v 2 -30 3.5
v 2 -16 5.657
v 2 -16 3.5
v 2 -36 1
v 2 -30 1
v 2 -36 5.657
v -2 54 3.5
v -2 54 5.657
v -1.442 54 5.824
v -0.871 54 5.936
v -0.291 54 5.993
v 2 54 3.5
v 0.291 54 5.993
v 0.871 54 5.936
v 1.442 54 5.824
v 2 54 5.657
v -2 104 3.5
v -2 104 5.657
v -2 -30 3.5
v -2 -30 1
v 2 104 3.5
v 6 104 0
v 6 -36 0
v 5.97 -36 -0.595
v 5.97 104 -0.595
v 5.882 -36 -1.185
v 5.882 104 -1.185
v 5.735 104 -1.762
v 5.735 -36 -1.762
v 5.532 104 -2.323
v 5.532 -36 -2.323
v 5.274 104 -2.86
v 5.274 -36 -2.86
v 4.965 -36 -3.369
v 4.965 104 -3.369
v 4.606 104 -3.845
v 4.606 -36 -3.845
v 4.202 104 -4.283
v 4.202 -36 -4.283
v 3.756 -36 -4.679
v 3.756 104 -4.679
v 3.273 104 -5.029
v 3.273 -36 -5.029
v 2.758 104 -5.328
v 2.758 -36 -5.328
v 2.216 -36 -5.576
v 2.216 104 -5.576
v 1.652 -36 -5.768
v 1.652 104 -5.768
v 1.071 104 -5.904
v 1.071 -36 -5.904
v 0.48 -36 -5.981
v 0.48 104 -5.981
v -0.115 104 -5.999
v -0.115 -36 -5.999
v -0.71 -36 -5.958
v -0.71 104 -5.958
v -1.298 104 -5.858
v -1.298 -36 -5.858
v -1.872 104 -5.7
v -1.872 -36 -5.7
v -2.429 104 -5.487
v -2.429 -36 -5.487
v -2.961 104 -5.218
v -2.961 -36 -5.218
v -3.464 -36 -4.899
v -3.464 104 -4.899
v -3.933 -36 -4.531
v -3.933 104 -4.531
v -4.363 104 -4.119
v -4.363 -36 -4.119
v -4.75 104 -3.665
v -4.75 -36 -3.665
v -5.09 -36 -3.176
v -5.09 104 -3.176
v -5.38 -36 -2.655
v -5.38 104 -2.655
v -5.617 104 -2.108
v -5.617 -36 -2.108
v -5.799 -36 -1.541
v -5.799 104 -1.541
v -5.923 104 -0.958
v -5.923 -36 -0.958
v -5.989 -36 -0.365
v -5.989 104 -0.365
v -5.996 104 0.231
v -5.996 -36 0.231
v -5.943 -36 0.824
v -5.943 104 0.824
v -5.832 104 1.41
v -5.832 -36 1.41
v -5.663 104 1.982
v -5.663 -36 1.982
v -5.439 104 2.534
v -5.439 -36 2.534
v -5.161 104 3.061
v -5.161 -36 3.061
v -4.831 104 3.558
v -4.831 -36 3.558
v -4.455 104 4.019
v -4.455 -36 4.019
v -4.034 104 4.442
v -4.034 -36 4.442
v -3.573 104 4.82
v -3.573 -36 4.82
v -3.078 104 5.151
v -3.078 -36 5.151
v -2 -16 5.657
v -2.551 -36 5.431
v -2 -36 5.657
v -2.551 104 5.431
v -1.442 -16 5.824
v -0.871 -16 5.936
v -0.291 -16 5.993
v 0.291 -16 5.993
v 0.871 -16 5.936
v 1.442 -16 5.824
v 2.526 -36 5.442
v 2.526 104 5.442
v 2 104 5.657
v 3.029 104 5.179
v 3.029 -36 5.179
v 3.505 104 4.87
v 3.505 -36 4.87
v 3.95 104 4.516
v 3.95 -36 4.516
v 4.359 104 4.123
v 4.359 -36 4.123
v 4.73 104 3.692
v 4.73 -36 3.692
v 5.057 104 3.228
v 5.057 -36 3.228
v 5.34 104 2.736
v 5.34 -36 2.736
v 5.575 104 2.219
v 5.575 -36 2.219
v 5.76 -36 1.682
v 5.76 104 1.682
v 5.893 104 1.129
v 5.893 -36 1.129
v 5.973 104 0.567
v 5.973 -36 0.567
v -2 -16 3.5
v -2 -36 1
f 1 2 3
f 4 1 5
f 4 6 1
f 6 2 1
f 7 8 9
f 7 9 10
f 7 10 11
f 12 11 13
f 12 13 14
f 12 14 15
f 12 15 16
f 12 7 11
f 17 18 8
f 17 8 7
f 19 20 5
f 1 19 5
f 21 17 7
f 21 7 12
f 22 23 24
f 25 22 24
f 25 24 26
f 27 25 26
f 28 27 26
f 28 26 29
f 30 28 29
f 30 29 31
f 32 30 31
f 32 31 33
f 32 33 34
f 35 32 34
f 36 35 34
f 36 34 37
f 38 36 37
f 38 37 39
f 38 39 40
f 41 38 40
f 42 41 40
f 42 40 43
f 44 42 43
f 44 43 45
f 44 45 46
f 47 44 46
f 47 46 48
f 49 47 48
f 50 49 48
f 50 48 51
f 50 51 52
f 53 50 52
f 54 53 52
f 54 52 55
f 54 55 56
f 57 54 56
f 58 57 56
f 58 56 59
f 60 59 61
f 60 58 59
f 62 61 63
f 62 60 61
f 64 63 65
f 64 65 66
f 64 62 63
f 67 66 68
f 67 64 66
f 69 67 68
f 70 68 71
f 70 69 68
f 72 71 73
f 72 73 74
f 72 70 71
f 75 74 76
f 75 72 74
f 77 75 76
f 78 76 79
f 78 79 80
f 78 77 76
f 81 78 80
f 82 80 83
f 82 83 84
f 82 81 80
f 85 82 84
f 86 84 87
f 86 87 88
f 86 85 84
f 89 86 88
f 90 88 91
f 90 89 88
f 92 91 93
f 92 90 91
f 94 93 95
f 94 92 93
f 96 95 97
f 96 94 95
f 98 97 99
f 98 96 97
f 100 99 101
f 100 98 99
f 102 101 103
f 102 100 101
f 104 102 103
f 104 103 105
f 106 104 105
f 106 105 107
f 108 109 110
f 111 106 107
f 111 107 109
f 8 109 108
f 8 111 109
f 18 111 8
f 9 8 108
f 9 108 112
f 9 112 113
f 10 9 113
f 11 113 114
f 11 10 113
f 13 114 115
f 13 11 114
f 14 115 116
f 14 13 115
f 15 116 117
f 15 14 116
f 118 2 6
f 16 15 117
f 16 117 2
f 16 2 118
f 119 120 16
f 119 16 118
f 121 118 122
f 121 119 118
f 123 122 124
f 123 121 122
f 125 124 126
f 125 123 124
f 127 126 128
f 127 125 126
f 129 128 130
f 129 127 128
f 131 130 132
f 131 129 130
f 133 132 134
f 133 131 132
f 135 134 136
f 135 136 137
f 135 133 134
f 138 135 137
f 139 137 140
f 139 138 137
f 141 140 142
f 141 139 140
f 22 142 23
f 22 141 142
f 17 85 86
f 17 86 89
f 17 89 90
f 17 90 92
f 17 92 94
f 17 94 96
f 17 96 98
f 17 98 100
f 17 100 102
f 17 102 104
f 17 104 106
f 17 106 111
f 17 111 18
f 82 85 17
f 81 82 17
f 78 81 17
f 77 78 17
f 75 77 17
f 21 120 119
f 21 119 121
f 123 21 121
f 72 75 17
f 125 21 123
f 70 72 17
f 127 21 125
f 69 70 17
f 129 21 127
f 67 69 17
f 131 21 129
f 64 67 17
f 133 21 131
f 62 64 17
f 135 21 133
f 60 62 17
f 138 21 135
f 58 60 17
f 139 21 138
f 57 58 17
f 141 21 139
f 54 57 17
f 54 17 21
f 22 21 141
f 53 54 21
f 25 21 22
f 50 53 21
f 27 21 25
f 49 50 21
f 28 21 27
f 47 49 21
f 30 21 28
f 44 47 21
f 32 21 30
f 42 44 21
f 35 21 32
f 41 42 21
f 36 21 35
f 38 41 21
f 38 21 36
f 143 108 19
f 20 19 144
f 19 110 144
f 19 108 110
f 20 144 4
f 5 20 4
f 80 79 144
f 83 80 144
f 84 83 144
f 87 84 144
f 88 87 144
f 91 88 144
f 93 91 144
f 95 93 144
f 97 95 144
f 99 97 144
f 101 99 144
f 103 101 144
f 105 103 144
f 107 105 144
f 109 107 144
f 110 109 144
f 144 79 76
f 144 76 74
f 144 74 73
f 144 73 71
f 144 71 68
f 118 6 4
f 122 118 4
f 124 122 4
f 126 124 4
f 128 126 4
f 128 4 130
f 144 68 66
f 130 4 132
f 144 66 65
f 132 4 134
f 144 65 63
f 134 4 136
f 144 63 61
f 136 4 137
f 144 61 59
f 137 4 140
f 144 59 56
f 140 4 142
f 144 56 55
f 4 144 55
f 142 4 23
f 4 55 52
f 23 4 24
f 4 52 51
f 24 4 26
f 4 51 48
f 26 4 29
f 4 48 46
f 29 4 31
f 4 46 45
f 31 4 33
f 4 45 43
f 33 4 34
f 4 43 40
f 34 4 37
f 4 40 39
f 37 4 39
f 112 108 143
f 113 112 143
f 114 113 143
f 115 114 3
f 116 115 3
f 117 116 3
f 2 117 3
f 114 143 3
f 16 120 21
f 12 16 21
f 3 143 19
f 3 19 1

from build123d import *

# Parameters (mm, degrees)
SKETCH1_R                = 6
BOSS_EXTRUDE1_DEPTH      = 104
BOSS_EXTRUDE1_DEPTH_BACK = 36
CUT_EXTRUDE3_START       = -36
SKETCH2_W                = 4
SKETCH2_H                = 5
CUT_EXTRUDE3_DEPTH       = 20
CUT_EXTRUDE3_DEPTH_BACK  = 0.0001
CUT_EXTRUDE4_START       = 104
SKETCH2_2_W              = 4
SKETCH2_2_H              = 5
CUT_EXTRUDE4_DEPTH       = 50
CUT_EXTRUDE6_START       = -36
SKETCH3_W                = 4
SKETCH3_H                = 10
CUT_EXTRUDE6_DEPTH       = 6


with BuildPart() as part:
    # Sketch1 → Boss-Extrude1 (new body, two sides)
    with BuildSketch(Plane(origin=(0, 0, 0), x_dir=(1, 0, 0), z_dir=(0, 1, 0))) as boss_extrude1_sk:
        Circle(SKETCH1_R)
    extrude(amount=BOSS_EXTRUDE1_DEPTH)
    extrude(boss_extrude1_sk.sketch, amount=-BOSS_EXTRUDE1_DEPTH_BACK)

    # Sketch2 → Cut-Extrude3 (cut, two sides)
    with BuildSketch(Plane(origin=(0, 0, 0), x_dir=(1, 0, 0), z_dir=(0, 1, 0)).offset(CUT_EXTRUDE3_START)) as cut_extrude3_sk:
        with Locations((0, -6)):
            Rectangle(SKETCH2_W, SKETCH2_H)
    extrude(amount=CUT_EXTRUDE3_DEPTH, mode=Mode.SUBTRACT)
    extrude(cut_extrude3_sk.sketch, amount=-CUT_EXTRUDE3_DEPTH_BACK, mode=Mode.SUBTRACT)

    # Sketch2<2> → Cut-Extrude4 (cut)
    with BuildSketch(Plane(origin=(0, 0, 0), x_dir=(1, 0, 0), z_dir=(0, 1, 0)).offset(CUT_EXTRUDE4_START)):
        with Locations((0, -6)):
            Rectangle(SKETCH2_2_W, SKETCH2_2_H)
    extrude(amount=-CUT_EXTRUDE4_DEPTH, mode=Mode.SUBTRACT)

    # Sketch3 → Cut-Extrude6 (cut)
    with BuildSketch(Plane(origin=(0, 0, 0), x_dir=(1, 0, 0), z_dir=(0, 1, 0)).offset(CUT_EXTRUDE6_START)):
        with Locations((0, -6)):
            Rectangle(SKETCH3_W, SKETCH3_H)
    extrude(amount=CUT_EXTRUDE6_DEPTH, mode=Mode.SUBTRACT)


solid = part.part
